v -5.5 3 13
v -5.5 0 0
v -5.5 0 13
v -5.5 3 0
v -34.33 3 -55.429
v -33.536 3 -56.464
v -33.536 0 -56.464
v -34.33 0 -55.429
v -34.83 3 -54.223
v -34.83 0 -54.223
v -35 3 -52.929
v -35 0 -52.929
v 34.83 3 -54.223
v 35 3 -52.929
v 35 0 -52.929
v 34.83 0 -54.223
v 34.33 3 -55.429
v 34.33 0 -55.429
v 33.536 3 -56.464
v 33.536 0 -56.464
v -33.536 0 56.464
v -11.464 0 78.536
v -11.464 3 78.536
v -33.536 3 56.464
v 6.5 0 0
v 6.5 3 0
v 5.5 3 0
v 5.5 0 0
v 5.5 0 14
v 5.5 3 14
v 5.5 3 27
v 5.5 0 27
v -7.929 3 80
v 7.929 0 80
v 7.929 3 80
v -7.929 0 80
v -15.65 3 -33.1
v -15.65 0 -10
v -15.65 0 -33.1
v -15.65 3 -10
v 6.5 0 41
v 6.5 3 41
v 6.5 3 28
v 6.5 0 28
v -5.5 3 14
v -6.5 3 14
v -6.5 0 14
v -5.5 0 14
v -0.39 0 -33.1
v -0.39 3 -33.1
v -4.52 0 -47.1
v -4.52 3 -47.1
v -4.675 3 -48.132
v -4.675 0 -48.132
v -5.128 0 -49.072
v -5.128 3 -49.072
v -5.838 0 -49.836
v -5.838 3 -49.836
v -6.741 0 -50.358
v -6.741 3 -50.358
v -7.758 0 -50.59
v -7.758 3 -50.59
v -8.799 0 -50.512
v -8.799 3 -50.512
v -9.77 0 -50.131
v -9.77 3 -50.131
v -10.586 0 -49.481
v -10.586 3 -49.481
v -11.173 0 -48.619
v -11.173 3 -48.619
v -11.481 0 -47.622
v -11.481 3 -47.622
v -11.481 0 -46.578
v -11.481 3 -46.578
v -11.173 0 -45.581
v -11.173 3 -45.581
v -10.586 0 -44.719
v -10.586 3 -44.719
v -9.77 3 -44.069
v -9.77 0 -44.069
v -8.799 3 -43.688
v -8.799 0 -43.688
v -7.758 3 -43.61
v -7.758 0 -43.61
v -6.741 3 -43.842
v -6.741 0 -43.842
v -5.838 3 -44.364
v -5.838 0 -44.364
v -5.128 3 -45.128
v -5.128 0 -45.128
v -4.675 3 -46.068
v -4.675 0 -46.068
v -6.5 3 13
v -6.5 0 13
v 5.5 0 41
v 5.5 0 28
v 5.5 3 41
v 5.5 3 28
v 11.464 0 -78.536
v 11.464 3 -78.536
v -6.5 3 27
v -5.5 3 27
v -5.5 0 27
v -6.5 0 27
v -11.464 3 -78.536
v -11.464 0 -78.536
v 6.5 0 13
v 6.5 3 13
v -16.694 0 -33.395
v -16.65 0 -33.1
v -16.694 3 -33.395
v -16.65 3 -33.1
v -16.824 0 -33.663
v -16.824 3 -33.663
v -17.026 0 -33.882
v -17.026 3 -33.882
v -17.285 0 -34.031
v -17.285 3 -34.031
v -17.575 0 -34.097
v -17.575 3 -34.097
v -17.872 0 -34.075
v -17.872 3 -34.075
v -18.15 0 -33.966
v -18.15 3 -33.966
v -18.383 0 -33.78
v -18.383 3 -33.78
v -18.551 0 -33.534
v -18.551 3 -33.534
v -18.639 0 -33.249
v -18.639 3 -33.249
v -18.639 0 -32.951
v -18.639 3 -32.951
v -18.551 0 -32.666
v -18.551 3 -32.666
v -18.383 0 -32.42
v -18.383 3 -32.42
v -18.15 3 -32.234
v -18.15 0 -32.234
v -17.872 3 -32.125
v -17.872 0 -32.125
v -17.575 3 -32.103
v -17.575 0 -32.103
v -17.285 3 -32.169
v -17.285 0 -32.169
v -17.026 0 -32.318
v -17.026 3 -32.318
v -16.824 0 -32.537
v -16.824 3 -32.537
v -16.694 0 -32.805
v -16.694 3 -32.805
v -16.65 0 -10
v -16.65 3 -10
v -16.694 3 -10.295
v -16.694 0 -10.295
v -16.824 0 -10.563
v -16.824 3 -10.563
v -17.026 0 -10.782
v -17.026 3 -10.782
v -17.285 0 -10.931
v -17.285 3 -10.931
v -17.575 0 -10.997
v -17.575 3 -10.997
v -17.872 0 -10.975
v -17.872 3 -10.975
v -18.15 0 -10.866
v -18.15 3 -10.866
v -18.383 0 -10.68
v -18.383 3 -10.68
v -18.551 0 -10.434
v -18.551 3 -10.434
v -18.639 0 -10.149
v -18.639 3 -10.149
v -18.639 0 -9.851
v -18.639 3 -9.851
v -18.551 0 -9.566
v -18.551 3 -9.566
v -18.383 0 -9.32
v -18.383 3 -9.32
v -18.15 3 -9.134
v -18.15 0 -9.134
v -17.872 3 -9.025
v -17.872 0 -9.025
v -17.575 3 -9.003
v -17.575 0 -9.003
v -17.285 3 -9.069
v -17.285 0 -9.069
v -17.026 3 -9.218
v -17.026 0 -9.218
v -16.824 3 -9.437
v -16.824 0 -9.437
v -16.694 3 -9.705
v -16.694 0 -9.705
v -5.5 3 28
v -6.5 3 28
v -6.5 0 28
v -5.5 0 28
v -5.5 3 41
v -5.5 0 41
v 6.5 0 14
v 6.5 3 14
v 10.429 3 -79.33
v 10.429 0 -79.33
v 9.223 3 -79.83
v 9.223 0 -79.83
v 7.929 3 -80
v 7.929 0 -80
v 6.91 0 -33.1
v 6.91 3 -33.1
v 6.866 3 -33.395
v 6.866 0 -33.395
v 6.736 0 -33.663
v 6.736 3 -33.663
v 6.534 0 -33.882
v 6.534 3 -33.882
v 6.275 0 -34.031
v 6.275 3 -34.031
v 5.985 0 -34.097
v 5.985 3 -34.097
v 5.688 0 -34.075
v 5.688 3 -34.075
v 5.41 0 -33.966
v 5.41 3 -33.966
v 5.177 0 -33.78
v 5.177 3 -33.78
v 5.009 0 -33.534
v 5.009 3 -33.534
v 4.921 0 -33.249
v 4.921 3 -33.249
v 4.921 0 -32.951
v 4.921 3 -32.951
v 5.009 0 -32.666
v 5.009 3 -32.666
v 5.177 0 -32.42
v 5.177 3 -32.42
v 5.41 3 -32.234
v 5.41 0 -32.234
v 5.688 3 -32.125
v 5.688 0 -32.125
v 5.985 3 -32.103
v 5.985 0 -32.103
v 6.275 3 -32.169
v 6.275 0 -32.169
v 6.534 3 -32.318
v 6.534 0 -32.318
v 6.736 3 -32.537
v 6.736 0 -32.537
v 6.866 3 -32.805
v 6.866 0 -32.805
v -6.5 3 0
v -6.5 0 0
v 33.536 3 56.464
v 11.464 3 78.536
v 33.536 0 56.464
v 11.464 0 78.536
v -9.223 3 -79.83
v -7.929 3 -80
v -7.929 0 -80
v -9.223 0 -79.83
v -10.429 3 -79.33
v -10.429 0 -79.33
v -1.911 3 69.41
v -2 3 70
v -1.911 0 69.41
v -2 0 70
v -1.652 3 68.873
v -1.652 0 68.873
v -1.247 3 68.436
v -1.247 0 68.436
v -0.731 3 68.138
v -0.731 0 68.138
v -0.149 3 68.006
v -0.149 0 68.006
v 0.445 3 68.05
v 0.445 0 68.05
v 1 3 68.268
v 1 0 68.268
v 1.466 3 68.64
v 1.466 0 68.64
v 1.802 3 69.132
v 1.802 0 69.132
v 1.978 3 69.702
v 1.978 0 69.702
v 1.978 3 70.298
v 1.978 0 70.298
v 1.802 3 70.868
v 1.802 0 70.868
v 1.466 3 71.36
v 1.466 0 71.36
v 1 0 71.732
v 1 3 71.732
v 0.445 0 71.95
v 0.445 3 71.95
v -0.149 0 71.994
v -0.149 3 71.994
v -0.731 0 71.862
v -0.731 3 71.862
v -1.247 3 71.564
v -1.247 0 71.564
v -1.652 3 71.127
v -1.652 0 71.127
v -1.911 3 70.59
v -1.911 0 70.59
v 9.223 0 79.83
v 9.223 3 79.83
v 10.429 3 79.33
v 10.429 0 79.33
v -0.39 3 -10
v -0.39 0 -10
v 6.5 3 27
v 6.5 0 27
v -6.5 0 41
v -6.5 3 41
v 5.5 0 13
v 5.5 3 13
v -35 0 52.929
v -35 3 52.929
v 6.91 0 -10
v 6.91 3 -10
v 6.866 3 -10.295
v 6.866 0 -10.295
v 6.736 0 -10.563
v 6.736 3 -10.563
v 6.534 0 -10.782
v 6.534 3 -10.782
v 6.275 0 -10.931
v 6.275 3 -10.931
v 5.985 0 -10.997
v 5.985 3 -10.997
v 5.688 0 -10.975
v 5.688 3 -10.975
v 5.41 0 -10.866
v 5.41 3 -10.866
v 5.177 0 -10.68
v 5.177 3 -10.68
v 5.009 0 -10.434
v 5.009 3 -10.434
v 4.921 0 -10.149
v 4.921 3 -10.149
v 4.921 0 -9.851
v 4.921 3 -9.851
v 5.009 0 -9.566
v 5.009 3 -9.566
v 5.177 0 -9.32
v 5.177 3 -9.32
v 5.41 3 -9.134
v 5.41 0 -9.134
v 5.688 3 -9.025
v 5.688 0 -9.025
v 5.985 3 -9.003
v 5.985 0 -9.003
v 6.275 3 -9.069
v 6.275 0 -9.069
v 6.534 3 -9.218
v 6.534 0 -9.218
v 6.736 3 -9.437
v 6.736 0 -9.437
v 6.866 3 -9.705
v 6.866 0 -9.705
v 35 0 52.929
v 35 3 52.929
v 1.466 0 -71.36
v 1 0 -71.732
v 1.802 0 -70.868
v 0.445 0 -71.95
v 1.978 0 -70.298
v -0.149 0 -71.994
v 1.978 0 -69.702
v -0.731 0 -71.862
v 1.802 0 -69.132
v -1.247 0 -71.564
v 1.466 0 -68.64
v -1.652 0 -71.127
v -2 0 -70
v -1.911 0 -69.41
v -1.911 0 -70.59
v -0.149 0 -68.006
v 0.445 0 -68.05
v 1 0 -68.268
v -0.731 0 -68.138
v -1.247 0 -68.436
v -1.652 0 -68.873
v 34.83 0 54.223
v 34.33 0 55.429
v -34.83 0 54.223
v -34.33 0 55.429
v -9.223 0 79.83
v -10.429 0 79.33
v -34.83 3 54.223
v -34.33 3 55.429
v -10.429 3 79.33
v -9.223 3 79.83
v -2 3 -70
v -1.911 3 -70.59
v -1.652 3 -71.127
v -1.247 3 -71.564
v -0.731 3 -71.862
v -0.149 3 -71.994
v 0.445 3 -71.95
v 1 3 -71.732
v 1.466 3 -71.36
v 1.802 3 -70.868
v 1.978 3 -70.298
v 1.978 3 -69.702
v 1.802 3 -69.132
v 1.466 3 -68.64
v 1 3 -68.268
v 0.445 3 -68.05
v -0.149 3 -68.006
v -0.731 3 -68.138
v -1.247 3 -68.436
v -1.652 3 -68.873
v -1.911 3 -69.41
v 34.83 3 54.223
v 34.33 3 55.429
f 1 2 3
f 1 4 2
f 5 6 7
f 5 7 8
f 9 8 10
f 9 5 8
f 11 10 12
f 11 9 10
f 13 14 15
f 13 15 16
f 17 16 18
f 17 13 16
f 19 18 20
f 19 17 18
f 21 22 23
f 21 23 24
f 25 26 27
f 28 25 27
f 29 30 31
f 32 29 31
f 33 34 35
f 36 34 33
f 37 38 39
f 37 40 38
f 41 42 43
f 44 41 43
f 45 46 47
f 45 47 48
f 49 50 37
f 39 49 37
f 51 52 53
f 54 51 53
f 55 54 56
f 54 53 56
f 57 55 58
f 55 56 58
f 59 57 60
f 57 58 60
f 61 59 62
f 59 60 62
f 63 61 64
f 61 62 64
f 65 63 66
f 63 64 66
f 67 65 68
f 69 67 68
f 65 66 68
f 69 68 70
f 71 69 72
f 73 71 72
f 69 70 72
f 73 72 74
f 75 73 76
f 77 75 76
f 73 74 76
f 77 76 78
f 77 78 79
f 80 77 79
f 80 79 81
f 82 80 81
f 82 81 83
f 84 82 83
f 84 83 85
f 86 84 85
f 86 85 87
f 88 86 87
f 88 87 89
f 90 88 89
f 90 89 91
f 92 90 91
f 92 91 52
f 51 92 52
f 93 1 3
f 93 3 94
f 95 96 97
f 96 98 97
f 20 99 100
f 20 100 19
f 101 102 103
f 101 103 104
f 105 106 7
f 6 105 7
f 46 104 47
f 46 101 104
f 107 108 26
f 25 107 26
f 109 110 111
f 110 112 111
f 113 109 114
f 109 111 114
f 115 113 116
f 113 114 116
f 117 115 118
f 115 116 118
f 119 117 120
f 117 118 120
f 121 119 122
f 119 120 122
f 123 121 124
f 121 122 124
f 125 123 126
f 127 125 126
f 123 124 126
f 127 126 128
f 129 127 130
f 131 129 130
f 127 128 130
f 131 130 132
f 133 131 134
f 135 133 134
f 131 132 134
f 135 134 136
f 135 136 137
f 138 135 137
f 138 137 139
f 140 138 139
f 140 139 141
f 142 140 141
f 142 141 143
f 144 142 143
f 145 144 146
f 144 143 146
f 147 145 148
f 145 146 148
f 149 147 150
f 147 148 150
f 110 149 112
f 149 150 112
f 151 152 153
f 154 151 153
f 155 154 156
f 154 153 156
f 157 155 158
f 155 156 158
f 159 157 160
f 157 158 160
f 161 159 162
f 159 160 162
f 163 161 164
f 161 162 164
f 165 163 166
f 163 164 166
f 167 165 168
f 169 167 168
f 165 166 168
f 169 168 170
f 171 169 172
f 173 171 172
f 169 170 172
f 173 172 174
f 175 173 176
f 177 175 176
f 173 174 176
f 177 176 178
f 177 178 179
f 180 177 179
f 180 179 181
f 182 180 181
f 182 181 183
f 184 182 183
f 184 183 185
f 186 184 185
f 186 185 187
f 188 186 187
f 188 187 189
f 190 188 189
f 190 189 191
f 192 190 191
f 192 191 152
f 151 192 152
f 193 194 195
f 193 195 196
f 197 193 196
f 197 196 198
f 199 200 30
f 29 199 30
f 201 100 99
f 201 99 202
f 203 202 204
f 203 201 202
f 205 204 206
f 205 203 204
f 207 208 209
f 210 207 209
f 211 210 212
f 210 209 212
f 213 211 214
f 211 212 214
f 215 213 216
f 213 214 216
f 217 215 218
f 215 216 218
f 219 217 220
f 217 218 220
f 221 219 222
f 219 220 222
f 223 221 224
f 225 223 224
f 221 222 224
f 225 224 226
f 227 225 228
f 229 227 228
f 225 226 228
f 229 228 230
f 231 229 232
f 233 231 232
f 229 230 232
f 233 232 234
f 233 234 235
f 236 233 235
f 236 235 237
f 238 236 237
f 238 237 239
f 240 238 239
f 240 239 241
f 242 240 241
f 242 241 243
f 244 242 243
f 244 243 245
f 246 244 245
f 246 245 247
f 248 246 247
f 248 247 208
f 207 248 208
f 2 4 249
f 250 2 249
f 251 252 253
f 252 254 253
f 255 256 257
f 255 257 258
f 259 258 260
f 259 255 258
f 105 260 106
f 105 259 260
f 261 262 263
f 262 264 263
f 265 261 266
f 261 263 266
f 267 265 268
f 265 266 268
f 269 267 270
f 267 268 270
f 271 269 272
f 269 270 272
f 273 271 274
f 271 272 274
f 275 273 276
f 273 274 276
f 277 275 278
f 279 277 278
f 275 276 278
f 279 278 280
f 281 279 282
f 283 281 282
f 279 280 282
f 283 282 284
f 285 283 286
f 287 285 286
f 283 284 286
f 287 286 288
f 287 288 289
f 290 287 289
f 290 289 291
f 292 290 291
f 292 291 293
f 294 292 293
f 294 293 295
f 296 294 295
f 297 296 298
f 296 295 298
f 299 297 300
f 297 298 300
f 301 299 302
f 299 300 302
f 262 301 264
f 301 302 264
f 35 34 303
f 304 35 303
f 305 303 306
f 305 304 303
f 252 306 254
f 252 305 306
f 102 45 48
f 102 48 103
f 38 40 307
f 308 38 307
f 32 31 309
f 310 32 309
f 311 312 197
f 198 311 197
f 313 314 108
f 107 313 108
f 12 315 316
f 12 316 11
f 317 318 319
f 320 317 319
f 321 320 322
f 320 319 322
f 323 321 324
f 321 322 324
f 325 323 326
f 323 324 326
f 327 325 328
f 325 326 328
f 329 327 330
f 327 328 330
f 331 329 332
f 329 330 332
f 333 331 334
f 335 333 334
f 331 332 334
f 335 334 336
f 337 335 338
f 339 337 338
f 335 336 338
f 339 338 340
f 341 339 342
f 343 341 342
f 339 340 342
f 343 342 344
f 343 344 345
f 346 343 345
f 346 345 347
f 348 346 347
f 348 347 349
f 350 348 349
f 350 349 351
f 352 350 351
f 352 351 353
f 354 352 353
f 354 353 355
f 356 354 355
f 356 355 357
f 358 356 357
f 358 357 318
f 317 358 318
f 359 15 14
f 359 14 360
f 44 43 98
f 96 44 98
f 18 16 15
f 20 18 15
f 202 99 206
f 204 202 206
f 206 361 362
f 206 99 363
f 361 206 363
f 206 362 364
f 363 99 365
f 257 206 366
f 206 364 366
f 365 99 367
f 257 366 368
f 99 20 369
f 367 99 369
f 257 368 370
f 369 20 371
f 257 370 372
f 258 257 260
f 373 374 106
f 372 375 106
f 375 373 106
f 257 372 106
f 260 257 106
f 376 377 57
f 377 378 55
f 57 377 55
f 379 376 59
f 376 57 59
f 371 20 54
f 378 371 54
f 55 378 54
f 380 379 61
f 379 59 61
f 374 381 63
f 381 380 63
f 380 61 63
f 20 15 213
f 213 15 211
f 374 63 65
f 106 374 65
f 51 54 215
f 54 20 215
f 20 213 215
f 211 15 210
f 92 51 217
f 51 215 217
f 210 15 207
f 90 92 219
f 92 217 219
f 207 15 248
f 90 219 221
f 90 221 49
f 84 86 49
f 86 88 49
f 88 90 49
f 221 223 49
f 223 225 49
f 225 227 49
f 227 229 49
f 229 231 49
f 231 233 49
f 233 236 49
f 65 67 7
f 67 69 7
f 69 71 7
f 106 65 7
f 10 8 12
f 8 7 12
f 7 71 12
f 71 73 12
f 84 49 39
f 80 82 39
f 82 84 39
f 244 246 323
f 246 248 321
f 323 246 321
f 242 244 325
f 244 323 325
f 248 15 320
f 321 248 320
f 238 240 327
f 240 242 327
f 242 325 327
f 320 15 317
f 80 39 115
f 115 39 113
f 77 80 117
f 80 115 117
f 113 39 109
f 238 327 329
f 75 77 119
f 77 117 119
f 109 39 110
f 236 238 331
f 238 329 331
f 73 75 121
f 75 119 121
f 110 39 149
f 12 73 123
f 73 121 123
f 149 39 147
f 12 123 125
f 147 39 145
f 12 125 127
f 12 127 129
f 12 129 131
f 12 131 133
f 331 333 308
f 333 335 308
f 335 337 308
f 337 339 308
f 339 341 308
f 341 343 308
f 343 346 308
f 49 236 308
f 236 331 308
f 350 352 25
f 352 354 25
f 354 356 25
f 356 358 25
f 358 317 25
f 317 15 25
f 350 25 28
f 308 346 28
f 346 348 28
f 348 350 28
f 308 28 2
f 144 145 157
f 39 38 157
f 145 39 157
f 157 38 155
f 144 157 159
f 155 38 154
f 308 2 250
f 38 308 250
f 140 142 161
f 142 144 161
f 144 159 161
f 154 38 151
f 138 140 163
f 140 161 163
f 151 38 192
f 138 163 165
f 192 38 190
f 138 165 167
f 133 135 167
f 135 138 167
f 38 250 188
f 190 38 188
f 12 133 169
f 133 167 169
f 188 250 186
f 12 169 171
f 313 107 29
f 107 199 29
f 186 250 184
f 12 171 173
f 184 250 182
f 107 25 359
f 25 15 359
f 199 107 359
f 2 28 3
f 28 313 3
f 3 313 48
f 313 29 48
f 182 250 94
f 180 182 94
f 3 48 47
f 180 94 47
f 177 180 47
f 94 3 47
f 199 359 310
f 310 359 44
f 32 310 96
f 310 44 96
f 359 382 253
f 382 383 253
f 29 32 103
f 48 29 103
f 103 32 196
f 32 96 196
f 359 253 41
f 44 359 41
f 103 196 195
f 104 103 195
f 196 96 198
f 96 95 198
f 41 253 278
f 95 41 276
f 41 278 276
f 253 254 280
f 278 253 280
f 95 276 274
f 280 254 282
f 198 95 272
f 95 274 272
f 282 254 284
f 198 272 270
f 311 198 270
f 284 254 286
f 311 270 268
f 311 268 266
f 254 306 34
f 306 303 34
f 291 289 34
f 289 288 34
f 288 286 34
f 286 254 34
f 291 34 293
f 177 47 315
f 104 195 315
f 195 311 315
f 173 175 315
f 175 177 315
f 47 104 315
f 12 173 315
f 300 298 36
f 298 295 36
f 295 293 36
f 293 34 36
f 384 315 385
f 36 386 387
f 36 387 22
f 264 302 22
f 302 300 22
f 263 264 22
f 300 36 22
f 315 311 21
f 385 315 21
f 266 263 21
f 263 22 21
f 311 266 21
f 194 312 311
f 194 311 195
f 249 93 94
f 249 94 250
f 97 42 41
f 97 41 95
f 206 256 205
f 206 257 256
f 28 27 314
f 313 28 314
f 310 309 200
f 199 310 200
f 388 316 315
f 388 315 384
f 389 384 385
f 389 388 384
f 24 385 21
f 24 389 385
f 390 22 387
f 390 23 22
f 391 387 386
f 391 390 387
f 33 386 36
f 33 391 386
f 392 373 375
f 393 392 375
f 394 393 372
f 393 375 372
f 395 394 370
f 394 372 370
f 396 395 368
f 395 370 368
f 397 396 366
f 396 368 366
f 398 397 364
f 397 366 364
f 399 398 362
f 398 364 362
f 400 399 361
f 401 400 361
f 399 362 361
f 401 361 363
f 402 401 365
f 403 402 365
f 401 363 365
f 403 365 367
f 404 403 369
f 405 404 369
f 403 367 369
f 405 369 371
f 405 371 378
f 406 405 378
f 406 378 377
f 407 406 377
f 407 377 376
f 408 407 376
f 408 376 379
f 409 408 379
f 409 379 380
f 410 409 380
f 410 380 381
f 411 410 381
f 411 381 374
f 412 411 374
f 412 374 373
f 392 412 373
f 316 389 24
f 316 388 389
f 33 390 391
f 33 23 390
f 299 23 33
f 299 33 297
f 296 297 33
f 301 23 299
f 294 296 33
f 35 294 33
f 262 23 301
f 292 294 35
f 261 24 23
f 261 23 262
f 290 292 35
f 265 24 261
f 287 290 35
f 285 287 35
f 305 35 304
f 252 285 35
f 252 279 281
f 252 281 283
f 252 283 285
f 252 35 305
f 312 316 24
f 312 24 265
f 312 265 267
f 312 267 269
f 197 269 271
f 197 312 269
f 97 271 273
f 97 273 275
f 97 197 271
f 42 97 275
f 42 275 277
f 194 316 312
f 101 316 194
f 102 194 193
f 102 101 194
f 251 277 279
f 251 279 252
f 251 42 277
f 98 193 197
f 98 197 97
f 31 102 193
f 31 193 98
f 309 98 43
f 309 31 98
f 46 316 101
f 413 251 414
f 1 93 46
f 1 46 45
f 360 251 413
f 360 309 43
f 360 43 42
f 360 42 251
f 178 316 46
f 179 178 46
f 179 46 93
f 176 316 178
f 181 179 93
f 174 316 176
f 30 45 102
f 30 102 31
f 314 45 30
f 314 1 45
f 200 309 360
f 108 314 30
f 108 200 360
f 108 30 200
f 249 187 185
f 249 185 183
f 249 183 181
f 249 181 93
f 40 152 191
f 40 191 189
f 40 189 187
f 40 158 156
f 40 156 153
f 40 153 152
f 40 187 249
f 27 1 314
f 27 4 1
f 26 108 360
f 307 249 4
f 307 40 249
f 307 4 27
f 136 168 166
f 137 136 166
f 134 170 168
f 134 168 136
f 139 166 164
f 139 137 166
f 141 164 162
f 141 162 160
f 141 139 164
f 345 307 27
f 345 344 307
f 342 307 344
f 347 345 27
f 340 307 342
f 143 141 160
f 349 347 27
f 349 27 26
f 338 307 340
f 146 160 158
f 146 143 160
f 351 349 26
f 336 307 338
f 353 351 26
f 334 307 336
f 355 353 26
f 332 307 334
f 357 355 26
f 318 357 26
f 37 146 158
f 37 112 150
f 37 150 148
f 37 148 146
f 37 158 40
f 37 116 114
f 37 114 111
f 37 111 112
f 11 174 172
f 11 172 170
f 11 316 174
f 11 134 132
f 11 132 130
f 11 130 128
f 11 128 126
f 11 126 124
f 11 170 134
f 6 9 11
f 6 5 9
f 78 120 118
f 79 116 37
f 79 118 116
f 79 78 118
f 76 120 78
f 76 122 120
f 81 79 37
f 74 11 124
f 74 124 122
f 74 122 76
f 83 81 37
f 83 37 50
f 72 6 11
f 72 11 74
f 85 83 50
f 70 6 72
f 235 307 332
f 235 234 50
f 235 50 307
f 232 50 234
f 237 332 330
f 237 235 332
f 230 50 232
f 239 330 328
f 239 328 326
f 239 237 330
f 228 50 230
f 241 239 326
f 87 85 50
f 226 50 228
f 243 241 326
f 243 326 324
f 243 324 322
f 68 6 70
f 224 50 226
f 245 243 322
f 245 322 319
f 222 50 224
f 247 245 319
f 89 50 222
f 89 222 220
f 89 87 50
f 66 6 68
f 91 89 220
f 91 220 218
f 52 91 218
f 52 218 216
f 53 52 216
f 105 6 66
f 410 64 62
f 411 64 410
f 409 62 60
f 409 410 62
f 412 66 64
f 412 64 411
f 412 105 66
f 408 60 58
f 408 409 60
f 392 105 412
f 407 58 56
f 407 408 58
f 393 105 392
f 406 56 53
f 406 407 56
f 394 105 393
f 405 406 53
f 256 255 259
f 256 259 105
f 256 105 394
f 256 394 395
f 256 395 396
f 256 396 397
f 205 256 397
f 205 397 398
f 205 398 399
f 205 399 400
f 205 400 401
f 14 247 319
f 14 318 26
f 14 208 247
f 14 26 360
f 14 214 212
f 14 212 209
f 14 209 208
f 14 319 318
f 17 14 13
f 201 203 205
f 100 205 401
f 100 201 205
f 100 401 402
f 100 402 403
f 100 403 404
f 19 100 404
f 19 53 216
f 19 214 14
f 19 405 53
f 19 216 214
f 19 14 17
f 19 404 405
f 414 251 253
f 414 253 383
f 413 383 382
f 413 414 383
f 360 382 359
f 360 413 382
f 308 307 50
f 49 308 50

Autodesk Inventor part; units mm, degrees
ref_plane "YZ Plane" through (0, 0, 0) normal (1, 0, 0) x (0, 1, 0)
ref_plane "XZ Plane" through (0, 0, 0) normal (0, 1, 0) x (-1, 0, 0)
ref_plane "XY Plane" through (0, 0, 0) normal (0, 0, 1) x (1, 0, 0)
sketch "Sketch1" plane through (0, 0, 0) normal (0, 1, 0) x (-1, 0, 0)
  line L0 (0, 0) -> (0, 80)
  line L1 (0, 80) -> (0, -80)
  line L2 (0, 80) -> (35, 80)
  line L3 (35, 80) -> (35, -80)
  line L4 (35, -80) -> (-35, -80)
  line L5 (-35, -80) -> (-35, 80)
  line L6 (-35, 80) -> (0, 80)
  line L7 (0, 80) -> (10, 80)
  line L8 (35, 80) -> (35, 55)
  line L9 (10, 80) -> (35, 55)
  line L10 (35, 0) -> (-35, 0)
  line L11 (0, 80) -> (0, -80)
  line L12 (10, -80) -> (35, -55)
  line L13 (-10, 80) -> (-35, 55)
  line L14 (-10, -80) -> (-35, -55)
  line L15 (0, 0) -> (0, 70)
  line L16 (0, 70) -> (0, -70)
  circle A0 centre (0, 70) radius 2
  circle A1 centre (0, -70) radius 2
  dimension "d0" = 80
  dimension "d1" = 160
  dimension "d2" = 35
  dimension "d3" = 70
  dimension "d4" = 10
  dimension "d5" = 25
  dimension "d6" = 70
  dimension "d7" = 140
  dimension "d8" = 4
  dimension "d9" = 4
extrude "Extrusion1" add sketch "Sketch1" along normal blind 3 contours L10 L5 L13 L6 L0 A0 | L10 L3 L12 L4 L1 A1 | L0 A0 L2 L9 L3 L10 | L1 A1 L4 L14 L5 L10
fillet "Fillet1" radius 5 8 edges at (-35, 1.5, 55) (-10, 1.5, 80) (-35, 1.5, -55) (35, 1.5, 55) (10, 1.5, 80) (35, 1.5, -55) (10, 1.5, -80) (-10, 1.5, -80)
sketch "Sketch2" plane through (0, 3, 0) normal (0, 1, 0) x (1, 0, 0)
  line L0 (0, 0) -> (0, 10)
  line L1 (5.9101, 10) -> (-17.6499, 10)
  line L2 (-17.6499, 10) -> (-17.6499, 33.1)
  line L3 (-17.6499, 33.1) -> (5.9101, 33.1)
  line L4 (5.9101, 33.1) -> (5.9101, 10)
  line L5 (0, 10) -> (0, 21.55)
  line L6 (0, 21.55) -> (20, 21.55)
  line L7 (35, -52.9289) -> (35, 52.9289) projected
  circle A0 centre (20, 21.55) radius 3.5
  circle A1 centre (-17.6499, 10) radius 1
  circle A2 centre (-17.6499, 33.1) radius 1
  circle A3 centre (5.9101, 10) radius 1
  circle A4 centre (5.9101, 33.1) radius 1
  line L8 (0, 0) -> (-6, 0)
  line L9 (-6, 0) -> (-6, -50)
  line L10 (-6, -50) -> (6, -50)
  line L11 (6, -50) -> (6, 0)
  line L12 (6, 0) -> (-6, 0)
  line L13 (-6, -50) -> (-6.5, -50)
  line L14 (-6.5, -50) -> (-6.5, 0)
  line L15 (-6.5, 0) -> (-5.5, 0)
  line L16 (-5.5, 0) -> (-5.5, -50)
  line L17 (-5.5, -50) -> (-6.5, -50)
  line L18 (0, 0) -> (0, -66.8235)
  line L19 (6, -50) -> (6.5, -50)
  line L20 (6.5, -50) -> (6.5, 0)
  line L21 (6.5, 0) -> (5.5, 0)
  line L22 (5.5, 0) -> (5.5, -50)
  line L23 (5.5, -50) -> (6.5, -50)
  line L24 (0, 21.55) -> (6, 21.55)
  dimension "d13" = 10
  dimension "d14" = 23.56
  dimension "d15" = 23.1
  dimension "d16" = 11.55
  dimension "d17" = 20
  dimension "d18" = 7
  dimension "d19" = 2
  dimension "d20" = 2
  dimension "d21" = 2
  dimension "d22" = 2
  dimension "d23" = 6
  dimension "d24" = 50
  dimension "d25" = 12
  dimension "d26" = 0.5
  dimension "d27" = 1
  dimension "d37" = 6
extrude "Extrusion2" cut sketch "Sketch2" against normal blind 10 contours A0 | L16 L10 L9 L8 | L12 L11 L10 L22 | A1 L2 L1 | L1 L2 A1 | A3 L4 L1 | L1 L4 A3 | L9 L13 L14 L15 | L21 L20 L19 L11 | A2 L3 L2 | L2 L3 A2 | A4 L3 L4 | L4 L3 A4
sketch "Sketch3" plane through (0, 3, 0) normal (0, 1, 0) x (1, 0, 0)
  line L0 (-5.5, -50) -> (-5.5, 0) projected
  line L1 (-5.5, 0) -> (-5.5, -13)
  line L2 (-5.5, -13) -> (-6.5, -13)
  line L3 (-6.5, -50) -> (-6.5, 0) projected
  line L4 (-6.5, 0) -> (-6.5, -13)
  line L5 (-6.5, 0) -> (-5.5, 0)
  line L6 (-6.5, -13) -> (-6.5, -14)
  line L7 (-6.5, -14) -> (-5.5, -14)
  line L8 (-5.5, -14) -> (-5.5, -13)
  line L9 (-6.5, -13) -> (-5.5, -13)
  line L10 (-6.5, -14) -> (-6.5, -27)
  line L11 (-6.5, -27) -> (-6.5, -28)
  line L12 (-6.5, -28) -> (-5.5, -28)
  line L13 (-5.5, -28) -> (-5.5, -27)
  line L14 (-5.5, -27) -> (-6.5, -27)
  line L15 (-5.5, -14) -> (-5.5, -27)
  line L16 (-6.5, -28) -> (-6.5, -41)
  line L17 (-6.5, -41) -> (-5.5, -41)
  line L18 (-5.5, -41) -> (-5.5, -28)
  line L19 (-6.5, -28) -> (-5.5, -28)
  line L20 (-6.5, -50) -> (-5.5, -50) projected
  line L21 (-6.5, -41) -> (-6.5, -50)
  line L22 (-6.5, -50) -> (-5.5, -50)
  line L23 (-5.5, -50) -> (-5.5, -41)
  line L24 (0, 0) -> (0, -62.7524)
  line L25 (5.5, -50) -> (5.5, 0)
  line L26 (5.5, -13) -> (6.5, -13)
  line L27 (6.5, -50) -> (6.5, 0)
  line L28 (6.5, 0) -> (5.5, 0)
  line L29 (6.5, -14) -> (5.5, -14)
  line L30 (6.5, -28) -> (5.5, -28)
  line L31 (5.5, -27) -> (6.5, -27)
  line L32 (6.5, -41) -> (5.5, -41)
  line L33 (6.5, -50) -> (5.5, -50)
  dimension "d30" = 13
  dimension "d31" = 1
  dimension "d32" = 13
  dimension "d33" = 1
  dimension "d34" = 13
extrude "Extrusion3" add sketch "Sketch3" against normal blind 3 contours L20 L3 L17 L0 | L12 L3 L14 L0 | L7 L3 L2 L0 | L25 L32 L27 L33 | L25 L31 L27 L30 | L25 L26 L27 L29
sketch "Sketch4" plane through (0, 3, 0) normal (0, 1, 0) x (1, 0, 0)
  circle A0 centre (-17.6499, 10) radius 1 projected
  line L0 (-17.6499, 10) -> (-15.6499, 10)
  circle A1 centre (-17.6499, 33.1) radius 1 projected
  line L1 (-17.6499, 33.1) -> (-15.6499, 33.1)
  line L2 (-15.6499, 10) -> (-15.6499, 33.1)
  circle A2 centre (5.9101, 33.1) radius 1 projected
  line L3 (5.9101, 33.1) -> (-0.3899, 33.1)
  circle A3 centre (5.9101, 10) radius 1 projected
  line L4 (5.9101, 10) -> (-0.3899, 10)
  line L5 (-15.6499, 10) -> (-0.3899, 10)
  line L6 (-0.3899, 10) -> (-0.3899, 33.1)
  line L7 (-0.3899, 33.1) -> (-15.6499, 33.1)
  point P0 (0, 0)
  dimension "d38" = 2
  dimension "d39" = 2
  dimension "d40" = 6.3
  dimension "d41" = 6.3
extrude "Extrusion4" cut sketch "Sketch4" against normal blind 10 contours L2 L7 L6 L5
sketch "Sketch5" plane through (0, 3, 0) normal (0, 1, 0) x (1, 0, 0)
  circle A0 centre (20, 21.55) radius 3.5 projected
  circle A1 centre (20, 21.55) radius 3.5
  point P0 (0, 0)
extrude "Extrusion5" add sketch "Sketch5" against normal blind 3
sketch "Sketch6" plane through (0, 3, 0) normal (0, 1, 0) x (1, 0, 0)
  line L0 (0, 0) -> (0, 62.477)
  line L1 (-15.6499, 33.1) -> (-0.3899, 33.1) projected
  line L2 (-8.0199, 33.1) -> (-8.0199, 54.1)
  line L3 (-8.0199, 54.1) -> (0, 54.1)
  line L4 (-8.0199, 33.1) -> (-8.0199, 41.1)
  line L5 (-8.0199, 33.1) -> (-8.0199, 47.1)
  circle A0 centre (-8.0199, 47.1) radius 3.5
  dimension "d46" = 21
  dimension "d47" = 8
  dimension "d48" = 14
  dimension "d49" = 7
extrude "Extrusion6" cut sketch "Sketch6" against normal blind 3
properties part number "panel"
